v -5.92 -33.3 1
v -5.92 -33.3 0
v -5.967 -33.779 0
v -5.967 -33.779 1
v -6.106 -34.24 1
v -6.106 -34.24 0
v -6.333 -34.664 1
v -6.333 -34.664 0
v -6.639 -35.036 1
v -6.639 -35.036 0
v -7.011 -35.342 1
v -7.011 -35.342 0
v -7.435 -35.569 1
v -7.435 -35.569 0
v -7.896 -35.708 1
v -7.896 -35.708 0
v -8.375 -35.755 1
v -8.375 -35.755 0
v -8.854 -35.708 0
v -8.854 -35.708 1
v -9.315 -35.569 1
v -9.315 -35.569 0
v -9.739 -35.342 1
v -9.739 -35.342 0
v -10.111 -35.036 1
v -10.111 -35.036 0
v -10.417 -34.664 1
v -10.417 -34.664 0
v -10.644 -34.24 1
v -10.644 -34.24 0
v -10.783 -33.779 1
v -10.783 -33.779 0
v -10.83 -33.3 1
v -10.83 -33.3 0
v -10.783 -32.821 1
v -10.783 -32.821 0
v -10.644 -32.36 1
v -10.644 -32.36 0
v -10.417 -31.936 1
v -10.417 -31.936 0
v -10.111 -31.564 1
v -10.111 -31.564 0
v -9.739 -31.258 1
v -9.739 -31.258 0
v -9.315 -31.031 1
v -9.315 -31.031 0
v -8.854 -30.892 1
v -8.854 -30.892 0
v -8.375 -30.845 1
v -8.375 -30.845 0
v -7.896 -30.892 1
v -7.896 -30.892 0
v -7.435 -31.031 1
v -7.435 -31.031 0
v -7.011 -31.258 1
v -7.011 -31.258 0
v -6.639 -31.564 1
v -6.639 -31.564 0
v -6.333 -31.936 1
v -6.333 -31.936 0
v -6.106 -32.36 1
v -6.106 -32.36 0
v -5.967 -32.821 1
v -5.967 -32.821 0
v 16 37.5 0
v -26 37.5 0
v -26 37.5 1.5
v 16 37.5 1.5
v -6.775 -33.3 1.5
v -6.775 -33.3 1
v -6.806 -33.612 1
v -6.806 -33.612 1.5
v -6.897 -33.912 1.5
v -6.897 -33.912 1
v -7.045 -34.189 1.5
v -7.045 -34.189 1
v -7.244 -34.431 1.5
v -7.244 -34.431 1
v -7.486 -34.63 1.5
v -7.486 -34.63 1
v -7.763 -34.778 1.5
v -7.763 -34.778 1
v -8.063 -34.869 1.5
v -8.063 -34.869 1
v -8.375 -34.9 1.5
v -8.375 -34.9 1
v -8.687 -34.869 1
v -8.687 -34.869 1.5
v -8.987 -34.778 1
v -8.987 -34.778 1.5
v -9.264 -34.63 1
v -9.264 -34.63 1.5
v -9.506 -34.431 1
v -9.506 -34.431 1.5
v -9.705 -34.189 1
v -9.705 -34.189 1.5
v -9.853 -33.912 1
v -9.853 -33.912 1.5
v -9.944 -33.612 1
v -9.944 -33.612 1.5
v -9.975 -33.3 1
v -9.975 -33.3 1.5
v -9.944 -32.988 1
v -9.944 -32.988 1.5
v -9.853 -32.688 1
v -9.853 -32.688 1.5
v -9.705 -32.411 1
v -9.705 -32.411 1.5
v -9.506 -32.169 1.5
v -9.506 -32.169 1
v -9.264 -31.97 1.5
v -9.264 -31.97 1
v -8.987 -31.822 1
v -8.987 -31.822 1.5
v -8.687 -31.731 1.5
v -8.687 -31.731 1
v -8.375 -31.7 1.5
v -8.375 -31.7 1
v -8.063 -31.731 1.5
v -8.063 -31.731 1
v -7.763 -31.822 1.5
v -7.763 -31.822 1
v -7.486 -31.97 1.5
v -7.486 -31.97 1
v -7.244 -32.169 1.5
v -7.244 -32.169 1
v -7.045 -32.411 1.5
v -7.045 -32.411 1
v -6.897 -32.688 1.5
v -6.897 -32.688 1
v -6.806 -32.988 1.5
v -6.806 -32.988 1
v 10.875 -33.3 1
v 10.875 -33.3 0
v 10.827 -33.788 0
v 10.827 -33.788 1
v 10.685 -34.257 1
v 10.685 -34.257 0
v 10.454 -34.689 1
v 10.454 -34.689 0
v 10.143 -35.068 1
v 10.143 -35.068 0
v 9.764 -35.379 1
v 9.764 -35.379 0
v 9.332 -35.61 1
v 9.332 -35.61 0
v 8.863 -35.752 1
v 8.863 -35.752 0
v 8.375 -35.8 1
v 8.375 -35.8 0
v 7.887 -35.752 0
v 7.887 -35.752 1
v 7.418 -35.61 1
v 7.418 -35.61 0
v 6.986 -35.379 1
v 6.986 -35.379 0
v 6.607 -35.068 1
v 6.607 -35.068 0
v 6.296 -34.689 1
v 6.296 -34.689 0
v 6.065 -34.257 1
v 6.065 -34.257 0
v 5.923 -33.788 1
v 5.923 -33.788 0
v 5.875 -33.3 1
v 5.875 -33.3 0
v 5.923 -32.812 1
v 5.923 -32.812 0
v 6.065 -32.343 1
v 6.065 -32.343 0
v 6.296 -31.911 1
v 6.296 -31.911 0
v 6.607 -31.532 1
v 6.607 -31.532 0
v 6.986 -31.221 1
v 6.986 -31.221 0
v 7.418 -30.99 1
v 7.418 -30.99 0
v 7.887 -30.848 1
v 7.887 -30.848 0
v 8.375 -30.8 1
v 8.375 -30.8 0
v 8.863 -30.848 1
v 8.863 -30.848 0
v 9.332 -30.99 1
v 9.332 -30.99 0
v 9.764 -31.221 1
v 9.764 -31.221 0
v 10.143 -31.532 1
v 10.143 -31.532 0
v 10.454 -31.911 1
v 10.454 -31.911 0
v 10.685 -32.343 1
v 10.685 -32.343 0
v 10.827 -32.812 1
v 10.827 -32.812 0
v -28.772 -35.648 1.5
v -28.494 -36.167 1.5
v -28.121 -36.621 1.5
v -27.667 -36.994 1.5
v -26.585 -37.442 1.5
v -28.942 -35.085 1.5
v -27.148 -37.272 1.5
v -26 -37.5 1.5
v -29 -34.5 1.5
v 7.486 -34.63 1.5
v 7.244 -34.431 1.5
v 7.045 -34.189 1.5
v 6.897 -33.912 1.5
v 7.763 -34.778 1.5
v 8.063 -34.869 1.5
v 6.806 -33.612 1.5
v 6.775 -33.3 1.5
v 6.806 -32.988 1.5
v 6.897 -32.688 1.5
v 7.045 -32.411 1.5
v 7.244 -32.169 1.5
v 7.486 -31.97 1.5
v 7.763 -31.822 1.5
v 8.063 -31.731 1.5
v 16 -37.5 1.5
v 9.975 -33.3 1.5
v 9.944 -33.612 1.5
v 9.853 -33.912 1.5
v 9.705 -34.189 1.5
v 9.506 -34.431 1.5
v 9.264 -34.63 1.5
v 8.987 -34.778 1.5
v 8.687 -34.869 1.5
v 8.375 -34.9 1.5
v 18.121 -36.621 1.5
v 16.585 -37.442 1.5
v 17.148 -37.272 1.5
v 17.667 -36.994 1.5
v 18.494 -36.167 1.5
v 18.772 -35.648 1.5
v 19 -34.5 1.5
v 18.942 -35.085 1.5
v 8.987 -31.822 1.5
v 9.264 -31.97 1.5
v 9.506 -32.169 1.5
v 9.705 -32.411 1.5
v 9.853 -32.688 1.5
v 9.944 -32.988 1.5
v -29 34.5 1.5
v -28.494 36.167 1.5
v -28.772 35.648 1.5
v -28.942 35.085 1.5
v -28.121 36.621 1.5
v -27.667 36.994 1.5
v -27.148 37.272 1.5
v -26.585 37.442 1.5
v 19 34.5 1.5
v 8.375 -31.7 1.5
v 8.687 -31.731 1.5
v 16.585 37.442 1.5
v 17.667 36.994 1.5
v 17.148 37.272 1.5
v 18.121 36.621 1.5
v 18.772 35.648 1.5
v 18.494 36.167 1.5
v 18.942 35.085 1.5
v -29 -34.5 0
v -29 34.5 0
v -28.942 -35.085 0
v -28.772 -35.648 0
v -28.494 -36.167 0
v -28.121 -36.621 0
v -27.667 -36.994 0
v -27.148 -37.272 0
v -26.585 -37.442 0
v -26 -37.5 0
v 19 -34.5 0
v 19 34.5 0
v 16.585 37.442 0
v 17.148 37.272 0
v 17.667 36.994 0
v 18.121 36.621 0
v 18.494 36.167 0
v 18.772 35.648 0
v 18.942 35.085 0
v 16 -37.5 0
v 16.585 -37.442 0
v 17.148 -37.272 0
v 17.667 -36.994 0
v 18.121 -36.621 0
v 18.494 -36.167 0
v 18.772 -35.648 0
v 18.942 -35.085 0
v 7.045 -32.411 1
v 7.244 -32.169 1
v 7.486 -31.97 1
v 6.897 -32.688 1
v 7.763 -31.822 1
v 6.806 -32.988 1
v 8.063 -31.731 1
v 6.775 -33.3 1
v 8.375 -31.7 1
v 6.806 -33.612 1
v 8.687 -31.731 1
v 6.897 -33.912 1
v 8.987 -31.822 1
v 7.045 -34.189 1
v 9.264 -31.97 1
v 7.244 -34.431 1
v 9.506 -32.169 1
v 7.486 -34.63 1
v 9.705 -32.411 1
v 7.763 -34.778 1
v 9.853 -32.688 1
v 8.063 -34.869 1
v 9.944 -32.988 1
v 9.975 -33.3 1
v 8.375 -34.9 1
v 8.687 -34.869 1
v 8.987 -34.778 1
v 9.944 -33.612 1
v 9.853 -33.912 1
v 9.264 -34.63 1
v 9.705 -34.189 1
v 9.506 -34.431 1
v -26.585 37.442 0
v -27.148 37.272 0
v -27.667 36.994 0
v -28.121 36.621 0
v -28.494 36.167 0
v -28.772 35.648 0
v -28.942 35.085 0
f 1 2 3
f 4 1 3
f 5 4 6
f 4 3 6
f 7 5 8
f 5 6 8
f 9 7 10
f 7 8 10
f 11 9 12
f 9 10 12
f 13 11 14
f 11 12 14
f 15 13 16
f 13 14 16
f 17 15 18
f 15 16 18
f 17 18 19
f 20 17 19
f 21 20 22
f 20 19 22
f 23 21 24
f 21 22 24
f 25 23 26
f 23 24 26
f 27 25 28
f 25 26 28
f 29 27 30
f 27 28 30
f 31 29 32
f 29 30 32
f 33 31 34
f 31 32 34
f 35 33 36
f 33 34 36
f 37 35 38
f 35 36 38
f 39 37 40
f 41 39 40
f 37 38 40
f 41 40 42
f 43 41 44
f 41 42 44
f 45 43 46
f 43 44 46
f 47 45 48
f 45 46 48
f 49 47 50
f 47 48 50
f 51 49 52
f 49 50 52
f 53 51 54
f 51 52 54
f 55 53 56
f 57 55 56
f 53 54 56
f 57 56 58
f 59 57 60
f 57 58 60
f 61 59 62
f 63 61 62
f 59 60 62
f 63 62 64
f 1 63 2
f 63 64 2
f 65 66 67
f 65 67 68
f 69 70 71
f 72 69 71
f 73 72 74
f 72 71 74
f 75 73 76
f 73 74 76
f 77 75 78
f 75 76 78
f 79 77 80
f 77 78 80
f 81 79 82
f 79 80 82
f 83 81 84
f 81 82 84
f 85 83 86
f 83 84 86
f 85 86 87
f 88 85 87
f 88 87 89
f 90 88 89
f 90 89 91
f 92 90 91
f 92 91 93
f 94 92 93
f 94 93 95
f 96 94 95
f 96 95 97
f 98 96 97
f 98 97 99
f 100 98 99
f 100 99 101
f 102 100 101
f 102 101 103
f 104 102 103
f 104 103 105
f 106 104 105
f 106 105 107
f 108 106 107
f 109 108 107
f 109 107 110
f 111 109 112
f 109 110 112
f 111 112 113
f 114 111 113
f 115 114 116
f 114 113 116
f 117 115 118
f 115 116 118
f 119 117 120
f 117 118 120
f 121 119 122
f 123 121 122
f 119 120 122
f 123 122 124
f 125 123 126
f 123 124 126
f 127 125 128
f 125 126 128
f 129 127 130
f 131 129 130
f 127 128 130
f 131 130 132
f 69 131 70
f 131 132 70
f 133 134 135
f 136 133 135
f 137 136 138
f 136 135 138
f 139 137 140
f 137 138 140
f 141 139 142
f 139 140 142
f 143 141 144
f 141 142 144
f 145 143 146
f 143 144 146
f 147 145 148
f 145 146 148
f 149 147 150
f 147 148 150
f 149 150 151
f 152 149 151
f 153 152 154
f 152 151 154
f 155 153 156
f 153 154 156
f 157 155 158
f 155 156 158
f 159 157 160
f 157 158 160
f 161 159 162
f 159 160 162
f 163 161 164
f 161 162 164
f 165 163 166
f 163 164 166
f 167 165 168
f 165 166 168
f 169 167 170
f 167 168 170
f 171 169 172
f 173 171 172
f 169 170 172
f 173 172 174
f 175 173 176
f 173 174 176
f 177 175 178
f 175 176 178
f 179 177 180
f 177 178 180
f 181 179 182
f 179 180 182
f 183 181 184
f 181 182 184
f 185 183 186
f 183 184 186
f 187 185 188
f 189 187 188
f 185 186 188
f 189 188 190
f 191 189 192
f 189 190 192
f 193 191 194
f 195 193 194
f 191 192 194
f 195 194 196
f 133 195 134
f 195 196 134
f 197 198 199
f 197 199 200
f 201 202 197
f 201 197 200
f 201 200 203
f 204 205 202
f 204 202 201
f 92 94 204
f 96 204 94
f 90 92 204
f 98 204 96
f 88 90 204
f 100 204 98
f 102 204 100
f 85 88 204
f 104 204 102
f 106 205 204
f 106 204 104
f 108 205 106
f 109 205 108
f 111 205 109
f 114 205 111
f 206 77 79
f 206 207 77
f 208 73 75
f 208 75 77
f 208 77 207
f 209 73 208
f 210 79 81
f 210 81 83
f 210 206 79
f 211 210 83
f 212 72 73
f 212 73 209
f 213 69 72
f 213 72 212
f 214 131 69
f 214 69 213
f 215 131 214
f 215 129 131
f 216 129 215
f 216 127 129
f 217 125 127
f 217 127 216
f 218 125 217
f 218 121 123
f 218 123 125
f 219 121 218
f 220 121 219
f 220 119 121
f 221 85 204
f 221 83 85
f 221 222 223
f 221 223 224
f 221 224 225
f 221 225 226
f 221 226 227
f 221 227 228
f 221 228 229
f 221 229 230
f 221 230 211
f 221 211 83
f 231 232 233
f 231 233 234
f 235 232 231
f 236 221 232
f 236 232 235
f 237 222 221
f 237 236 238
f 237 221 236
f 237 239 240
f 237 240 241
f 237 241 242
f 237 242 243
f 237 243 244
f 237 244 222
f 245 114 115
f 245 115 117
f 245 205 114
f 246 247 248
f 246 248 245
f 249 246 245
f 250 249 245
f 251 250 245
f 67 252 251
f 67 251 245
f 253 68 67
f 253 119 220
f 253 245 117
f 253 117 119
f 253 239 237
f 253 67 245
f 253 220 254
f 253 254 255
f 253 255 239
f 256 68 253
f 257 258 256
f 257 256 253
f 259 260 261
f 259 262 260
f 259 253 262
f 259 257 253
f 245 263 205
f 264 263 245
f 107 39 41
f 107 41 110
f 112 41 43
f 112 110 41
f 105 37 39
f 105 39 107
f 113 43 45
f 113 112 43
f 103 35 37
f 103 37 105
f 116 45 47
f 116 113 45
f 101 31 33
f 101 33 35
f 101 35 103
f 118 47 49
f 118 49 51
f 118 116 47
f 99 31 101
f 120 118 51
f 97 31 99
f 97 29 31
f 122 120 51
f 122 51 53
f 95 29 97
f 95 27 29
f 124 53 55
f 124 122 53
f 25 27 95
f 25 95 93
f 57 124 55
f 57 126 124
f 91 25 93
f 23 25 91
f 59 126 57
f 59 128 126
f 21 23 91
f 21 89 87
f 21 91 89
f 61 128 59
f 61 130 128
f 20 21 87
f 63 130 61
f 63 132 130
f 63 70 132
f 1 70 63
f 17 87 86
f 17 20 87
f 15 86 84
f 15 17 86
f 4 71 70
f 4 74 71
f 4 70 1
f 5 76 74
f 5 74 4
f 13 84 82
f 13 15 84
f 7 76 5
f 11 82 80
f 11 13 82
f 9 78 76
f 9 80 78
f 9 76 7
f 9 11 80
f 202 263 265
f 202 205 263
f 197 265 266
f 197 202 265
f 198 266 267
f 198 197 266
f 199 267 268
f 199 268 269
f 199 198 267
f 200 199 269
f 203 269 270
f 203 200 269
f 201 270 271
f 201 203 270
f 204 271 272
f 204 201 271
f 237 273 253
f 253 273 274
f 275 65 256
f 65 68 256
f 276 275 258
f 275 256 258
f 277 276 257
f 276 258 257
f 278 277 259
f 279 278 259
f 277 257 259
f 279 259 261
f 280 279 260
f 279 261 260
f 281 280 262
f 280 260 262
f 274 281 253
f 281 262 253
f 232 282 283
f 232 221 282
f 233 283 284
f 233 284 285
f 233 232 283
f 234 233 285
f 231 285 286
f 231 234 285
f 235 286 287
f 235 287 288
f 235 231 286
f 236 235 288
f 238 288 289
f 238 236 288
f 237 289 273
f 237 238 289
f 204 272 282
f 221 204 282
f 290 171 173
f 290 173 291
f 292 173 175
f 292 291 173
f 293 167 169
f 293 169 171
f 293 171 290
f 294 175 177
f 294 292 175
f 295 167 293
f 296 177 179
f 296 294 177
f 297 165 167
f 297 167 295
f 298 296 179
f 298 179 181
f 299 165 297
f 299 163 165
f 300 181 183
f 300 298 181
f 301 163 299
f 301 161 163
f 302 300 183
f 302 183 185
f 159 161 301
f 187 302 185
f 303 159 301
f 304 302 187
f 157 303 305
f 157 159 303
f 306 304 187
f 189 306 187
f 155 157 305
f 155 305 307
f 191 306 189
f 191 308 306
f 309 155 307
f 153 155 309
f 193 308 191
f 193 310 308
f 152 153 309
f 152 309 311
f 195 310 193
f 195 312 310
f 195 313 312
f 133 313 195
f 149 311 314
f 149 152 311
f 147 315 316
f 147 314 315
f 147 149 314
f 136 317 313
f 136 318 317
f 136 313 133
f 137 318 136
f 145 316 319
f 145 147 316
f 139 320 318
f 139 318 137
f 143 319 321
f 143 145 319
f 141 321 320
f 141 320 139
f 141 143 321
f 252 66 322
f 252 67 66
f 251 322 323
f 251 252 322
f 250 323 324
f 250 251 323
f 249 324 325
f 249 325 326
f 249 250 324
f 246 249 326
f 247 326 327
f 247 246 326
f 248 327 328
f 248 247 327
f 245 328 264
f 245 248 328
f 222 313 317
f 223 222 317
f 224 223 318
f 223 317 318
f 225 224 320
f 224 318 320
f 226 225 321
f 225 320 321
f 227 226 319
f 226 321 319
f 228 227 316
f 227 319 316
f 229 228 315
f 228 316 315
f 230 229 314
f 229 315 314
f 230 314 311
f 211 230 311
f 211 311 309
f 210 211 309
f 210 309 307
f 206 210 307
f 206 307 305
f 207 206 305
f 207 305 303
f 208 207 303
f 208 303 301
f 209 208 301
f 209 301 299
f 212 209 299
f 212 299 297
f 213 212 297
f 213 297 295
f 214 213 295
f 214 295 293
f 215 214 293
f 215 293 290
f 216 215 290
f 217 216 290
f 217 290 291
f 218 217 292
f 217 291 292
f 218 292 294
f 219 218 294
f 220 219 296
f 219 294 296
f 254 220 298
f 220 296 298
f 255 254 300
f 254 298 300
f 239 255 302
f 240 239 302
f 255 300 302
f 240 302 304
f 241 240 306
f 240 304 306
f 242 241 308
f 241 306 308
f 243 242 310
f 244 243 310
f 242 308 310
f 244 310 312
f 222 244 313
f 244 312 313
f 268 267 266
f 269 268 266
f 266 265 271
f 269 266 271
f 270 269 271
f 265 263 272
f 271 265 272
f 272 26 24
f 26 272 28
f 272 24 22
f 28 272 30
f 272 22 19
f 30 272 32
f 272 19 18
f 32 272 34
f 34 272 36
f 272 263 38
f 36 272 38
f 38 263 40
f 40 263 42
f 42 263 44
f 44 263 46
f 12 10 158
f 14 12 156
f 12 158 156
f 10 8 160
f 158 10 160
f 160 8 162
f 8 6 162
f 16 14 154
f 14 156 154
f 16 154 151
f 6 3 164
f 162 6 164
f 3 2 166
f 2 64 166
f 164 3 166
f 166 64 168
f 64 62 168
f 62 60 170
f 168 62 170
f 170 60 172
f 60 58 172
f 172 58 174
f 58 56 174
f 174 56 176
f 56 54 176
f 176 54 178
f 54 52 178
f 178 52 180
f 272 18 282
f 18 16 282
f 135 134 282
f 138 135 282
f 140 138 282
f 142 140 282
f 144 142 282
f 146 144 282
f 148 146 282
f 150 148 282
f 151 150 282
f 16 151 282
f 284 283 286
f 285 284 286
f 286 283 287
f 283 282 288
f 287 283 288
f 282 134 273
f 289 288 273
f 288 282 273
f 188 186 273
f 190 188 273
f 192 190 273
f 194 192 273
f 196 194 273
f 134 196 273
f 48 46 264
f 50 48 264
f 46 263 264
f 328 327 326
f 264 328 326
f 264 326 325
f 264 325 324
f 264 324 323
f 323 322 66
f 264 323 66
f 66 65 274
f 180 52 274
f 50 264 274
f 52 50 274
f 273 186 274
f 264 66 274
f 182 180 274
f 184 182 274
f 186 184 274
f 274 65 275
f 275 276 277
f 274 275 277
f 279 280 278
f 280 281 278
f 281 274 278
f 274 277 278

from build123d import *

# Parameters (mm, degrees)
SKETCH_W        = 48
SKETCH_H        = 75
PAD_DEPTH       = 1.5
FILLET006_R     = 3
FILLET007_R     = 3
FILLET008_R     = 3
SKETCH010_R     = 1.6
POCKET009_DEPTH = 1.501
SKETCH015_R     = 2.455473
SKETCH015_R_2   = 2.5
POCKET011_DEPTH = 1


with BuildPart() as part:
    # Sketch → Pad (new body)
    with BuildSketch(Plane.XY):
        with Locations((-5, 0)):
            Rectangle(SKETCH_W, SKETCH_H)
    extrude(amount=PAD_DEPTH)

    # Fillet006
    fillet006_edges = [part.edges().sort_by_distance(p)[0] for p in [
        (-29, -37.5, 0.75),
    ]]
    fillet(fillet006_edges, radius=FILLET006_R)

    # Fillet007
    fillet007_edges = [part.edges().sort_by_distance(p)[0] for p in [
        (19, -37.5, 0.75),
        (19, 37.5, 0.75),
    ]]
    fillet(fillet007_edges, radius=FILLET007_R)

    # Fillet008
    fillet008_edges = [part.edges().sort_by_distance(p)[0] for p in [
        (-29, 37.5, 0.75),
    ]]
    fillet(fillet008_edges, radius=FILLET008_R)

    # Sketch010 → Pocket009 (cut, through all)
    with BuildSketch(Plane(origin=(0, 0, 0), x_dir=(1, 0, 0), z_dir=(0, 0, -1))):
        with Locations((-8.375, 33.3)):
            Circle(SKETCH010_R)
        with Locations((8.375, 33.3)):
            Circle(SKETCH010_R)
    extrude(amount=-POCKET009_DEPTH, mode=Mode.SUBTRACT)

    # Sketch015 → Pocket011 (cut)
    with BuildSketch(Plane(origin=(0, 0, 0), x_dir=(1, 0, 0), z_dir=(0, 0, -1))):
        with Locations((-8.375, 33.3)):
            Circle(SKETCH015_R)
        with Locations((8.375, 33.3)):
            Circle(SKETCH015_R_2)
    extrude(amount=-POCKET011_DEPTH, mode=Mode.SUBTRACT)


solid = part.part
